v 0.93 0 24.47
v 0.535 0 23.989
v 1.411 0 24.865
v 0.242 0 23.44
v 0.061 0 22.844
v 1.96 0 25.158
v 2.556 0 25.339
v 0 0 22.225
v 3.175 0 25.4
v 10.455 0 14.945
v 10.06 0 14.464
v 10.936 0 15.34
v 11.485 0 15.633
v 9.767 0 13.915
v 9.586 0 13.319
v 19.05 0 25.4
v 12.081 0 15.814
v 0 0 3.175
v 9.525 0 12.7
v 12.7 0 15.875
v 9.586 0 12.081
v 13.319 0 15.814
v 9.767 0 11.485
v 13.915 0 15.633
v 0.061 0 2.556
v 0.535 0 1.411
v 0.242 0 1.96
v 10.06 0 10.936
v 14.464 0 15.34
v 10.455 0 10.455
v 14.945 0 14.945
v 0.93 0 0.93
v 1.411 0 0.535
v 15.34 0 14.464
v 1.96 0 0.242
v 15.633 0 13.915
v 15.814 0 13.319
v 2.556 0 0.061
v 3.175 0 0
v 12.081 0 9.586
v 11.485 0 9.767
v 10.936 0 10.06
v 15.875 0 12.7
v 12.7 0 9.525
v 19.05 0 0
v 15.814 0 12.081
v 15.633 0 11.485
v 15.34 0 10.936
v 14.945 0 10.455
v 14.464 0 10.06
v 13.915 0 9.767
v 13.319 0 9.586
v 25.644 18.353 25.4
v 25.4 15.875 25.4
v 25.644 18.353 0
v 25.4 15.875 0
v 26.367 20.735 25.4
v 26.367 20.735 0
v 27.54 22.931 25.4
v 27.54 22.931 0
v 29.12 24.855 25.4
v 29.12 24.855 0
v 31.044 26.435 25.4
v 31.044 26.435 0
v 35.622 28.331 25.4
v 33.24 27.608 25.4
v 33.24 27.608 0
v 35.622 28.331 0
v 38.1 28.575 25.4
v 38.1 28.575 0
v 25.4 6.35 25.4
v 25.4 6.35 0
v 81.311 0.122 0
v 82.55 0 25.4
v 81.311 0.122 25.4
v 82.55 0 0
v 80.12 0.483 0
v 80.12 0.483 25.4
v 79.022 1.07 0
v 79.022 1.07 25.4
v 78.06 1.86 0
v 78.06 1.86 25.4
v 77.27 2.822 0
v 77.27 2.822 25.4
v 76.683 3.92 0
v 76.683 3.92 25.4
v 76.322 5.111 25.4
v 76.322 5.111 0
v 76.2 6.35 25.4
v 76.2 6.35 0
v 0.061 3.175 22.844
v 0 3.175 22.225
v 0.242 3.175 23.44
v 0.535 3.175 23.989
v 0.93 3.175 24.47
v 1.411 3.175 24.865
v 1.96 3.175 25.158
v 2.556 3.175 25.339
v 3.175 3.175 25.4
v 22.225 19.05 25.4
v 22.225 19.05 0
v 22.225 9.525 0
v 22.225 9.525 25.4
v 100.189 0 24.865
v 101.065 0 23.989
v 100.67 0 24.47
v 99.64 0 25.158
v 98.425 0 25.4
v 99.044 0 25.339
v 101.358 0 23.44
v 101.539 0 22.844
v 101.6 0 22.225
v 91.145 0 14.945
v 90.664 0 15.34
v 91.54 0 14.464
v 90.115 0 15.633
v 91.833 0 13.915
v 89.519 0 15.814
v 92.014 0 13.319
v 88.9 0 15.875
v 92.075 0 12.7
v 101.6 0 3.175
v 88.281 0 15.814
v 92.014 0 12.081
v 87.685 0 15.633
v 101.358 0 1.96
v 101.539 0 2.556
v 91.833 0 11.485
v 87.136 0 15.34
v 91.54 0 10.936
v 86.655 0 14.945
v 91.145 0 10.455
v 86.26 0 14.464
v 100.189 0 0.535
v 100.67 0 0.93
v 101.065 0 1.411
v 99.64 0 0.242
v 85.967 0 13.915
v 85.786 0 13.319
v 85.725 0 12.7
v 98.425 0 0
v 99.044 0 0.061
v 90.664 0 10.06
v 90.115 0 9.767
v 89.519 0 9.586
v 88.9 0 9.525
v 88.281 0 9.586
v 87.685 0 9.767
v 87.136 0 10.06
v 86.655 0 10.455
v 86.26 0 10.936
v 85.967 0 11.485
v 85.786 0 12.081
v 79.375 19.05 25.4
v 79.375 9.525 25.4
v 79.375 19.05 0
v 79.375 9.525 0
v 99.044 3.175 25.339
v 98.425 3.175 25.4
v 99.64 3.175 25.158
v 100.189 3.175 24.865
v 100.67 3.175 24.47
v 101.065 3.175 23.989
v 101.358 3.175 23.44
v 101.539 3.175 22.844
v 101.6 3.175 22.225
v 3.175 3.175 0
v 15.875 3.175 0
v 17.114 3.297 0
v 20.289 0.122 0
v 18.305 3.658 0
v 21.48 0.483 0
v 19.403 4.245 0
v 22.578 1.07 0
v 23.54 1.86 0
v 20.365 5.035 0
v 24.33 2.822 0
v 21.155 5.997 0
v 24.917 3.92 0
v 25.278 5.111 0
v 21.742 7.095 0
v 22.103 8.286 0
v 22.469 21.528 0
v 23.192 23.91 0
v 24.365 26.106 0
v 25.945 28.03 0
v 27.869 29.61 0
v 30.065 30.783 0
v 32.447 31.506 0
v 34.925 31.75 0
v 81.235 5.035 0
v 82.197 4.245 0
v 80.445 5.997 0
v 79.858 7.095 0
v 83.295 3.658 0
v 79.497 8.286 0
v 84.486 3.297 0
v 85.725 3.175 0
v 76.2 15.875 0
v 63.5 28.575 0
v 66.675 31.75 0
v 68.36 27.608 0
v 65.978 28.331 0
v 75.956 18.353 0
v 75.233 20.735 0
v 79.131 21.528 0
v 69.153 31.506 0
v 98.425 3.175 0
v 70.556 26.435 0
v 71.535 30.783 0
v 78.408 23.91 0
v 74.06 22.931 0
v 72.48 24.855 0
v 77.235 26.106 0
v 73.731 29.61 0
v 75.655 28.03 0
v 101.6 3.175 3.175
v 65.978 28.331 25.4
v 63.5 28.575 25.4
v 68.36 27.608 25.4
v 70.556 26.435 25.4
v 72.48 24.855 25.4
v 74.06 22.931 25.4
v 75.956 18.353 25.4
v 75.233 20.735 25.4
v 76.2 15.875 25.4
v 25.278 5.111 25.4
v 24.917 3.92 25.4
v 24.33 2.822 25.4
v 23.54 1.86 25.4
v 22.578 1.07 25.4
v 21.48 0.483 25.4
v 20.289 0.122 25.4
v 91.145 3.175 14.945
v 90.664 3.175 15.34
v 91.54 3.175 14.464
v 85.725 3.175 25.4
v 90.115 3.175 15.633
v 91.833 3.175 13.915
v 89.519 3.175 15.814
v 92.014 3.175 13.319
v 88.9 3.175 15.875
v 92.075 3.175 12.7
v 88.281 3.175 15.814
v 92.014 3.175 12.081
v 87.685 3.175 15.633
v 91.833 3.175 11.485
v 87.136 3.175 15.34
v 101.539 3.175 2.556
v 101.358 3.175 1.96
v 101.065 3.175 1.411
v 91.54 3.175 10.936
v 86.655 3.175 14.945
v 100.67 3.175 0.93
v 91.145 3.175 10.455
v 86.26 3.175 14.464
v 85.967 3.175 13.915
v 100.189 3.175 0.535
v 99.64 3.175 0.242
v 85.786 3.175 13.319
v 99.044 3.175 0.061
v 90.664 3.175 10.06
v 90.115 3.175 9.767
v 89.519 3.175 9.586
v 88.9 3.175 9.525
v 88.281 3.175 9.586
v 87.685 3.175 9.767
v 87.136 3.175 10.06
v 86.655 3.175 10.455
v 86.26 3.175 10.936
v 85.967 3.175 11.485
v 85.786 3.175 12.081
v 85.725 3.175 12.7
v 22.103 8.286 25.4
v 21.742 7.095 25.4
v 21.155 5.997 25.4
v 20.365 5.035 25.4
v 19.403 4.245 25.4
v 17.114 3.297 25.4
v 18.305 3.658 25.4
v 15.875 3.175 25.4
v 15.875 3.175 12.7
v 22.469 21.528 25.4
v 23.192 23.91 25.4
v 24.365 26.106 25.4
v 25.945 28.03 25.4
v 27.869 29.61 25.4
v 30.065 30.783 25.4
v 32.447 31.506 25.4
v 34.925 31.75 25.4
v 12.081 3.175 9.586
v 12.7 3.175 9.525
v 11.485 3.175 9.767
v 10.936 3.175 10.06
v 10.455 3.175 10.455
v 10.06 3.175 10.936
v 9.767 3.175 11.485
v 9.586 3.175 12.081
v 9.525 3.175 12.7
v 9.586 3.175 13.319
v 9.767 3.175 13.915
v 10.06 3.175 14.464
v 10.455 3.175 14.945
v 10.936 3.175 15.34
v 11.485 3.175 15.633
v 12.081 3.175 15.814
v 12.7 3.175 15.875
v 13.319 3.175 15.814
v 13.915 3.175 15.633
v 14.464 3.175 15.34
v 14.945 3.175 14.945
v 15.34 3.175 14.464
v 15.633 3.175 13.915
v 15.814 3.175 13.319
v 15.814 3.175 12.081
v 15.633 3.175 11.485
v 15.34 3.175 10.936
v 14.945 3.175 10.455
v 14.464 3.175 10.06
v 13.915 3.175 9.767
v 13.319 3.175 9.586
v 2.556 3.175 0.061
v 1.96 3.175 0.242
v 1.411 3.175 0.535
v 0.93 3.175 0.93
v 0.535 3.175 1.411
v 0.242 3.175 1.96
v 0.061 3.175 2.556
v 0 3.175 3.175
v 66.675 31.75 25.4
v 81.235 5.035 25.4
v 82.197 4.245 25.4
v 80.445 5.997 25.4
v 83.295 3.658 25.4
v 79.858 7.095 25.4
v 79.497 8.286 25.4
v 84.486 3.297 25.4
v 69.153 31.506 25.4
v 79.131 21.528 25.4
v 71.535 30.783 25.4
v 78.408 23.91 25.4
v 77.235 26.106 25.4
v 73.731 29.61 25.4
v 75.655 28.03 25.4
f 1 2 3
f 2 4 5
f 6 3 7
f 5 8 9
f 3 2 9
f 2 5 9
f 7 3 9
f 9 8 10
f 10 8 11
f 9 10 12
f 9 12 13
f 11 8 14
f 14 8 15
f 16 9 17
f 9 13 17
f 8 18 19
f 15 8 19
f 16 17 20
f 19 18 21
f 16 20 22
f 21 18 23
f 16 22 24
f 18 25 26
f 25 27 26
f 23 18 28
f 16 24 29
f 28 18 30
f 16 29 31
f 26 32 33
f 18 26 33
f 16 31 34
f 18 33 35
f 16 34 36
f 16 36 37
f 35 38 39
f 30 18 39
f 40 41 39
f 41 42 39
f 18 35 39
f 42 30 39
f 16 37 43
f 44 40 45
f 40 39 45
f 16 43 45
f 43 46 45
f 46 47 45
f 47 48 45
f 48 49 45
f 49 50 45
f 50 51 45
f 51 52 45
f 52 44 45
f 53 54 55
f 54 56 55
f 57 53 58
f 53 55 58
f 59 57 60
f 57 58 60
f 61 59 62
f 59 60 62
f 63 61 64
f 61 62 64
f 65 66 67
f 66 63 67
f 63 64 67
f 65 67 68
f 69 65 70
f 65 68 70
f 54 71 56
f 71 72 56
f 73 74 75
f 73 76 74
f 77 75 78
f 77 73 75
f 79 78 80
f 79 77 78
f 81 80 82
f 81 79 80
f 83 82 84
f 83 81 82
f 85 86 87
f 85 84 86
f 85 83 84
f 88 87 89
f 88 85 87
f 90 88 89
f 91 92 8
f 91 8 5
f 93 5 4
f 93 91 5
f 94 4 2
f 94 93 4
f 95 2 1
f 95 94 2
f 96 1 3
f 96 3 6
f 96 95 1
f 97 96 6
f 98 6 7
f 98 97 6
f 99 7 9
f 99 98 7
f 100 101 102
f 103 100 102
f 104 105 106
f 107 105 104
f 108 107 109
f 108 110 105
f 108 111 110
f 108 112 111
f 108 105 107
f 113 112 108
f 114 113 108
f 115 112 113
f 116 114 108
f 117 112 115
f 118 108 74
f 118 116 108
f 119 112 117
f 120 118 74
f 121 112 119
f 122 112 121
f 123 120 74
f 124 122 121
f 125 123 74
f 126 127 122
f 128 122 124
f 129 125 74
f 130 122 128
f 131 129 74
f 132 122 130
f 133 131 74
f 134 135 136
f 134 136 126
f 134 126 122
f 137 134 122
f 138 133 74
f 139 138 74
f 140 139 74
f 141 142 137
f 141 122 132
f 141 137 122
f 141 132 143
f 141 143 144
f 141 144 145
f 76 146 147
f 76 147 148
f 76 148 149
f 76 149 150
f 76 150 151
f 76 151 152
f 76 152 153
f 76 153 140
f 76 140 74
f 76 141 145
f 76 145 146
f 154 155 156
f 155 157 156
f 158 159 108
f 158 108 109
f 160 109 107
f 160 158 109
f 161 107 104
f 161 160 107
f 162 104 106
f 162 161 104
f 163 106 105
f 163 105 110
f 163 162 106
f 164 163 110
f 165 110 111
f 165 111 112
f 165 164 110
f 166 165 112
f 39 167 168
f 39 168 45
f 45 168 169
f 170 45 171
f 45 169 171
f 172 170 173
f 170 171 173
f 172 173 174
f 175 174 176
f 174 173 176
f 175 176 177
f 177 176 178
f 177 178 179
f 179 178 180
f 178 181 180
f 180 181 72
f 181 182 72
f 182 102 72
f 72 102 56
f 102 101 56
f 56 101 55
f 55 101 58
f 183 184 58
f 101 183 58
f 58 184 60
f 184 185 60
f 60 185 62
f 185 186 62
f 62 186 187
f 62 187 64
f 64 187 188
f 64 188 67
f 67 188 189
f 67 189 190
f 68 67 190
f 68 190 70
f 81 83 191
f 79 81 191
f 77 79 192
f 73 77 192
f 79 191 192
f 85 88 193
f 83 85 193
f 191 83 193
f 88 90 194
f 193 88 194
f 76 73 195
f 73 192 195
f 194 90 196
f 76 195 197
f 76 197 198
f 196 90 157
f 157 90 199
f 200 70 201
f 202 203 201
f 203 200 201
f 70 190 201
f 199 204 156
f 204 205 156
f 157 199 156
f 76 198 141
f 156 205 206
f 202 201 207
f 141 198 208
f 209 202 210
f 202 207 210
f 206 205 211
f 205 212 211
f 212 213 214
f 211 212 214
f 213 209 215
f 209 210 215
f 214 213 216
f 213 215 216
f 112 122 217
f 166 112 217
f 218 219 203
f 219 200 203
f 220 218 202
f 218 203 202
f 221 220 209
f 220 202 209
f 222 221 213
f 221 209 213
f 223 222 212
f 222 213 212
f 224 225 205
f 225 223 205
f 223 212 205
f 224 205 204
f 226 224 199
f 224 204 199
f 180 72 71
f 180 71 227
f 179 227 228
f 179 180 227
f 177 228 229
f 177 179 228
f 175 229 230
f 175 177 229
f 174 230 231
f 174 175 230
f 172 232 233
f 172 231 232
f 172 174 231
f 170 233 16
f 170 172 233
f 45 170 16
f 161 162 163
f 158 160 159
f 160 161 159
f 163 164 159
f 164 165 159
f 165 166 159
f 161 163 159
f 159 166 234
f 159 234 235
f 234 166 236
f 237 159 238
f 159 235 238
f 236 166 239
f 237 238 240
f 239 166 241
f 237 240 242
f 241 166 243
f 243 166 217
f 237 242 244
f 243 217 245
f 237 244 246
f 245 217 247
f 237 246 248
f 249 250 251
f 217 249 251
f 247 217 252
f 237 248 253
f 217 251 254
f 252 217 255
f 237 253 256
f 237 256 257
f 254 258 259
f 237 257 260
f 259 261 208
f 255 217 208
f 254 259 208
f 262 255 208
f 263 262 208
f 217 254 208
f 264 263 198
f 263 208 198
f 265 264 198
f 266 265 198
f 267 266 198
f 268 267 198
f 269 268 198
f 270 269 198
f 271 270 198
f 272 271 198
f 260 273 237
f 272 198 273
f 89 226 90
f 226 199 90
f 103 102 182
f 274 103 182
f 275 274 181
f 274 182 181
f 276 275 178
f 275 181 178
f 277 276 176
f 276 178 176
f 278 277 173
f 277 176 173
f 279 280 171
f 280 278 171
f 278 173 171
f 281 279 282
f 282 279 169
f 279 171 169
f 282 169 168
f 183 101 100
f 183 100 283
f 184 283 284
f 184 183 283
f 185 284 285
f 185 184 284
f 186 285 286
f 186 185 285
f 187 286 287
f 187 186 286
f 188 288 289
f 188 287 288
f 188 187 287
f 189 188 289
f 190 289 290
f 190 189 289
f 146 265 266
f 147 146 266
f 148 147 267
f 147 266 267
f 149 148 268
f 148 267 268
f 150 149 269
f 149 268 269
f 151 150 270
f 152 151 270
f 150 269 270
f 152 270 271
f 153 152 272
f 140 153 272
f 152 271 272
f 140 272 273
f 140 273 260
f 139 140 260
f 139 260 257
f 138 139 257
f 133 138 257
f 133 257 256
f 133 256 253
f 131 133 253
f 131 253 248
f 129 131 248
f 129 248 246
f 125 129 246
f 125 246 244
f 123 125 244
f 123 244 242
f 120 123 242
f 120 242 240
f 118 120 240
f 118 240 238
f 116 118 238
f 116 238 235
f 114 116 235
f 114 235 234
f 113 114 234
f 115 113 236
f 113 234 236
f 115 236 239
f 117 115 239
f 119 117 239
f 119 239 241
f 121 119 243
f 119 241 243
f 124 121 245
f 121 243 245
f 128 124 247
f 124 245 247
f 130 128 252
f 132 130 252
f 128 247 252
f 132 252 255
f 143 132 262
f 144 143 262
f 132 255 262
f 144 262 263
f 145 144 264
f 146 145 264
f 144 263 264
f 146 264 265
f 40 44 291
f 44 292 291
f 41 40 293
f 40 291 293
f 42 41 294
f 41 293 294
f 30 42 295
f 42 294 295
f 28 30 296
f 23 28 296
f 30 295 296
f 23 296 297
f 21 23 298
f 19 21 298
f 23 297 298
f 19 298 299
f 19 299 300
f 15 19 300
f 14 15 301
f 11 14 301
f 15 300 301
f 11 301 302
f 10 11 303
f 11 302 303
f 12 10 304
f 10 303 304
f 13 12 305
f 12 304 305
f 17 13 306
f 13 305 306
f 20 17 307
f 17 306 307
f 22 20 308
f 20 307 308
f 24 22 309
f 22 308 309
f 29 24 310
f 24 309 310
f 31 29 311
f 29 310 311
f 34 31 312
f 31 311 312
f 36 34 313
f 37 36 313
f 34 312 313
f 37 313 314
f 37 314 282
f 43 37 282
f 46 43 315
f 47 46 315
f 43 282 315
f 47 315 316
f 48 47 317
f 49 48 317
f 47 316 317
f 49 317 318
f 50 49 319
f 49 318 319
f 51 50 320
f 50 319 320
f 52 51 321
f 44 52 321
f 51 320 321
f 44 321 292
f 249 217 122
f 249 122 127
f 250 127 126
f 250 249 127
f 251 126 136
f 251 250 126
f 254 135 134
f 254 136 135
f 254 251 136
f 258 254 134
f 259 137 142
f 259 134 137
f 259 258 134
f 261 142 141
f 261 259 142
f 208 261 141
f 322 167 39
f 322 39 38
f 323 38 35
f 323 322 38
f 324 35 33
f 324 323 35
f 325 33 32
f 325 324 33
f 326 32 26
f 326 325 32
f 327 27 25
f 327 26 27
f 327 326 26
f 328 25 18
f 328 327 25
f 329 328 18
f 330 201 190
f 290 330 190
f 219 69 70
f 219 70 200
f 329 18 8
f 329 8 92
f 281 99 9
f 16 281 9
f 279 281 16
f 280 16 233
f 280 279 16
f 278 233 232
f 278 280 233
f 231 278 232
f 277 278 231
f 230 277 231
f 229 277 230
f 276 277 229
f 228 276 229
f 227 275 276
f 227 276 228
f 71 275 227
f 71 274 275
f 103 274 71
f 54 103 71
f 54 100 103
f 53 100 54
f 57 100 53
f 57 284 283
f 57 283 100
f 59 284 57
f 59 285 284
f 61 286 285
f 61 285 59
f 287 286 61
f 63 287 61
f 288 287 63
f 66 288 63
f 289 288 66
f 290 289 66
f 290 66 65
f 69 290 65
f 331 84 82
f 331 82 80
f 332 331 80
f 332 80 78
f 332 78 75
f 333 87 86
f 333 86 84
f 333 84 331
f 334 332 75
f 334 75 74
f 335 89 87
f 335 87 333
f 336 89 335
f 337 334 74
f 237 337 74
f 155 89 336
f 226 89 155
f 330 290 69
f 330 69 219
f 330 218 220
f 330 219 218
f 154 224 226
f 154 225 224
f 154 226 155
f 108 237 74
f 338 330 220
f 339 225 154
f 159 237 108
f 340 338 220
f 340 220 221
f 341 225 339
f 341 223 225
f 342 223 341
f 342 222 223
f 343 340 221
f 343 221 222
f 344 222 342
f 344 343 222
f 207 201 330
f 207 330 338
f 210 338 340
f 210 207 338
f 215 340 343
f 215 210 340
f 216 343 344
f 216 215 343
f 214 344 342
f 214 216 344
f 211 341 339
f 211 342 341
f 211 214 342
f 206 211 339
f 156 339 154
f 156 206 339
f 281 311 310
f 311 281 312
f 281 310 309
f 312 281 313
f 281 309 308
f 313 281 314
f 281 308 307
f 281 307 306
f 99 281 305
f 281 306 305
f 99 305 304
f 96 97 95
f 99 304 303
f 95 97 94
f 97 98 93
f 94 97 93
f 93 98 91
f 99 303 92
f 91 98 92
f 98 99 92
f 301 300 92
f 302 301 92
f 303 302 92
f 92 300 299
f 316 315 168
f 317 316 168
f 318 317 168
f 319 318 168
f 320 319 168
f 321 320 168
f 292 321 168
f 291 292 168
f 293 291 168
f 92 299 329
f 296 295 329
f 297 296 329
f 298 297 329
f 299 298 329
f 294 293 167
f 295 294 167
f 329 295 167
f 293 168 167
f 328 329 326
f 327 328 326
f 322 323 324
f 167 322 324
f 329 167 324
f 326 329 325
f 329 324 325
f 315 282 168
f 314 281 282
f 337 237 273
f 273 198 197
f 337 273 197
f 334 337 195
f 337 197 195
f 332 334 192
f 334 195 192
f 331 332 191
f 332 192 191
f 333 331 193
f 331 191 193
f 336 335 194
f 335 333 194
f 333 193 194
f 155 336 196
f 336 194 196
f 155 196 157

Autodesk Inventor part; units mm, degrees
ref_plane "YZ Plane" through (0, 0, 0) normal (1, 0, 0) x (0, 1, 0)
ref_plane "XZ Plane" through (0, 0, 0) normal (0, 1, 0) x (-1, 0, 0)
ref_plane "XY Plane" through (0, 0, 0) normal (0, 0, 1) x (1, 0, 0)
sketch "Sketch1" plane through (0, 0, 0) normal (0, 0, 1) x (1, 0, 0)
  line L0 (0, 0) -> (101.6, 0) construction
  line L1 (101.6, 0) -> (101.6, 38.1) construction
  line L2 (101.6, 38.1) -> (0, 38.1) construction
  line L3 (0, 38.1) -> (0, 0) construction
  line L4 (0, 0) -> (19.05, 0)
  line L5 (101.6, 0) -> (82.55, 0)
  line L6 (25.4, 6.35) -> (25.4, 15.875)
  line L7 (38.1, 28.575) -> (63.5, 28.575)
  line L8 (76.2, 15.875) -> (76.2, 6.35)
  line L9 (66.675, 31.75) -> (34.925, 31.75)
  line L10 (22.225, 19.05) -> (22.225, 9.525)
  line L11 (15.875, 3.175) -> (0, 3.175)
  line L12 (101.6, 3.175) -> (85.725, 3.175)
  line L13 (79.375, 9.525) -> (79.375, 19.05)
  line L14 (0, 0) -> (0, 3.175)
  line L15 (101.6, 0) -> (101.6, 3.175)
  arc A0 (34.925, 31.75) -> (22.225, 19.05) centre (34.925, 19.05) ccw
  arc A1 (38.1, 28.575) -> (25.4, 15.875) centre (38.1, 15.875) ccw
  arc A2 (79.375, 19.05) -> (66.675, 31.75) centre (66.675, 19.05) ccw
  arc A3 (76.2, 15.875) -> (63.5, 28.575) centre (63.5, 15.875) ccw
  arc A4 (15.875, 3.175) -> (22.225, 9.525) centre (15.875, 9.525) ccw
  arc A5 (79.375, 9.525) -> (85.725, 3.175) centre (85.725, 9.525) ccw
  arc A6 (76.2, 6.35) -> (82.55, 0) centre (82.55, 6.35) ccw
  arc A7 (19.05, 0) -> (25.4, 6.35) centre (19.05, 6.35) ccw
  point P0 (25.4, 0)
  point P1 (76.2, 0)
  point P2 (25.4, 28.575)
  dimension "d0" = 101.6
  dimension "d1" = 38.1
  dimension "d2" = 25.4
  dimension "d3" = 25.4
  dimension "d4" = 28.575
  dimension "d5" = 3.175
  dimension "d6" = 3.175
  dimension "d7" = 12.7
  dimension "d8" = 6.35
  dimension "d9" = 6.35
  dimension "d10" = 6.35
extrude "Extrusion1" add sketch "Sketch1" along normal blind 25.4
sketch "Sketch2" plane through (0, 0, 0) normal (0, -1, 0) x (1, 0, 0)
  line L0 (0, 0) -> (19.05, 0) projected
  line L1 (19.05, 0) -> (19.05, 25.4) projected
  line L2 (0, 25.4) -> (19.05, 25.4) projected
  line L3 (0, 0) -> (0, 25.4) projected
  line L4 (82.55, 0) -> (101.6, 0) projected
  line L5 (101.6, 0) -> (101.6, 25.4) projected
  line L6 (82.55, 25.4) -> (101.6, 25.4) projected
  line L7 (82.55, 0) -> (82.55, 25.4) projected
  point P0 (12.7, 12.7)
  point P1 (88.9, 12.7)
  dimension "d13" = 12.7
  dimension "d14" = 12.7
  dimension "d15" = 12.7
  dimension "d16" = 12.7
hole "Hole1" at (12.7, 0, 12.7) at (88.9, 0, 12.7) direction (0, 1, 0) diameter 6.35 end through all
fillet "Fillet1" radius 3.175 4 edges at (101.6, 1.5875, 25.4) (101.6, 1.5875, 0) (0, 1.5875, 25.4) (0, 1.5875, 0)
properties part number "hendel"
